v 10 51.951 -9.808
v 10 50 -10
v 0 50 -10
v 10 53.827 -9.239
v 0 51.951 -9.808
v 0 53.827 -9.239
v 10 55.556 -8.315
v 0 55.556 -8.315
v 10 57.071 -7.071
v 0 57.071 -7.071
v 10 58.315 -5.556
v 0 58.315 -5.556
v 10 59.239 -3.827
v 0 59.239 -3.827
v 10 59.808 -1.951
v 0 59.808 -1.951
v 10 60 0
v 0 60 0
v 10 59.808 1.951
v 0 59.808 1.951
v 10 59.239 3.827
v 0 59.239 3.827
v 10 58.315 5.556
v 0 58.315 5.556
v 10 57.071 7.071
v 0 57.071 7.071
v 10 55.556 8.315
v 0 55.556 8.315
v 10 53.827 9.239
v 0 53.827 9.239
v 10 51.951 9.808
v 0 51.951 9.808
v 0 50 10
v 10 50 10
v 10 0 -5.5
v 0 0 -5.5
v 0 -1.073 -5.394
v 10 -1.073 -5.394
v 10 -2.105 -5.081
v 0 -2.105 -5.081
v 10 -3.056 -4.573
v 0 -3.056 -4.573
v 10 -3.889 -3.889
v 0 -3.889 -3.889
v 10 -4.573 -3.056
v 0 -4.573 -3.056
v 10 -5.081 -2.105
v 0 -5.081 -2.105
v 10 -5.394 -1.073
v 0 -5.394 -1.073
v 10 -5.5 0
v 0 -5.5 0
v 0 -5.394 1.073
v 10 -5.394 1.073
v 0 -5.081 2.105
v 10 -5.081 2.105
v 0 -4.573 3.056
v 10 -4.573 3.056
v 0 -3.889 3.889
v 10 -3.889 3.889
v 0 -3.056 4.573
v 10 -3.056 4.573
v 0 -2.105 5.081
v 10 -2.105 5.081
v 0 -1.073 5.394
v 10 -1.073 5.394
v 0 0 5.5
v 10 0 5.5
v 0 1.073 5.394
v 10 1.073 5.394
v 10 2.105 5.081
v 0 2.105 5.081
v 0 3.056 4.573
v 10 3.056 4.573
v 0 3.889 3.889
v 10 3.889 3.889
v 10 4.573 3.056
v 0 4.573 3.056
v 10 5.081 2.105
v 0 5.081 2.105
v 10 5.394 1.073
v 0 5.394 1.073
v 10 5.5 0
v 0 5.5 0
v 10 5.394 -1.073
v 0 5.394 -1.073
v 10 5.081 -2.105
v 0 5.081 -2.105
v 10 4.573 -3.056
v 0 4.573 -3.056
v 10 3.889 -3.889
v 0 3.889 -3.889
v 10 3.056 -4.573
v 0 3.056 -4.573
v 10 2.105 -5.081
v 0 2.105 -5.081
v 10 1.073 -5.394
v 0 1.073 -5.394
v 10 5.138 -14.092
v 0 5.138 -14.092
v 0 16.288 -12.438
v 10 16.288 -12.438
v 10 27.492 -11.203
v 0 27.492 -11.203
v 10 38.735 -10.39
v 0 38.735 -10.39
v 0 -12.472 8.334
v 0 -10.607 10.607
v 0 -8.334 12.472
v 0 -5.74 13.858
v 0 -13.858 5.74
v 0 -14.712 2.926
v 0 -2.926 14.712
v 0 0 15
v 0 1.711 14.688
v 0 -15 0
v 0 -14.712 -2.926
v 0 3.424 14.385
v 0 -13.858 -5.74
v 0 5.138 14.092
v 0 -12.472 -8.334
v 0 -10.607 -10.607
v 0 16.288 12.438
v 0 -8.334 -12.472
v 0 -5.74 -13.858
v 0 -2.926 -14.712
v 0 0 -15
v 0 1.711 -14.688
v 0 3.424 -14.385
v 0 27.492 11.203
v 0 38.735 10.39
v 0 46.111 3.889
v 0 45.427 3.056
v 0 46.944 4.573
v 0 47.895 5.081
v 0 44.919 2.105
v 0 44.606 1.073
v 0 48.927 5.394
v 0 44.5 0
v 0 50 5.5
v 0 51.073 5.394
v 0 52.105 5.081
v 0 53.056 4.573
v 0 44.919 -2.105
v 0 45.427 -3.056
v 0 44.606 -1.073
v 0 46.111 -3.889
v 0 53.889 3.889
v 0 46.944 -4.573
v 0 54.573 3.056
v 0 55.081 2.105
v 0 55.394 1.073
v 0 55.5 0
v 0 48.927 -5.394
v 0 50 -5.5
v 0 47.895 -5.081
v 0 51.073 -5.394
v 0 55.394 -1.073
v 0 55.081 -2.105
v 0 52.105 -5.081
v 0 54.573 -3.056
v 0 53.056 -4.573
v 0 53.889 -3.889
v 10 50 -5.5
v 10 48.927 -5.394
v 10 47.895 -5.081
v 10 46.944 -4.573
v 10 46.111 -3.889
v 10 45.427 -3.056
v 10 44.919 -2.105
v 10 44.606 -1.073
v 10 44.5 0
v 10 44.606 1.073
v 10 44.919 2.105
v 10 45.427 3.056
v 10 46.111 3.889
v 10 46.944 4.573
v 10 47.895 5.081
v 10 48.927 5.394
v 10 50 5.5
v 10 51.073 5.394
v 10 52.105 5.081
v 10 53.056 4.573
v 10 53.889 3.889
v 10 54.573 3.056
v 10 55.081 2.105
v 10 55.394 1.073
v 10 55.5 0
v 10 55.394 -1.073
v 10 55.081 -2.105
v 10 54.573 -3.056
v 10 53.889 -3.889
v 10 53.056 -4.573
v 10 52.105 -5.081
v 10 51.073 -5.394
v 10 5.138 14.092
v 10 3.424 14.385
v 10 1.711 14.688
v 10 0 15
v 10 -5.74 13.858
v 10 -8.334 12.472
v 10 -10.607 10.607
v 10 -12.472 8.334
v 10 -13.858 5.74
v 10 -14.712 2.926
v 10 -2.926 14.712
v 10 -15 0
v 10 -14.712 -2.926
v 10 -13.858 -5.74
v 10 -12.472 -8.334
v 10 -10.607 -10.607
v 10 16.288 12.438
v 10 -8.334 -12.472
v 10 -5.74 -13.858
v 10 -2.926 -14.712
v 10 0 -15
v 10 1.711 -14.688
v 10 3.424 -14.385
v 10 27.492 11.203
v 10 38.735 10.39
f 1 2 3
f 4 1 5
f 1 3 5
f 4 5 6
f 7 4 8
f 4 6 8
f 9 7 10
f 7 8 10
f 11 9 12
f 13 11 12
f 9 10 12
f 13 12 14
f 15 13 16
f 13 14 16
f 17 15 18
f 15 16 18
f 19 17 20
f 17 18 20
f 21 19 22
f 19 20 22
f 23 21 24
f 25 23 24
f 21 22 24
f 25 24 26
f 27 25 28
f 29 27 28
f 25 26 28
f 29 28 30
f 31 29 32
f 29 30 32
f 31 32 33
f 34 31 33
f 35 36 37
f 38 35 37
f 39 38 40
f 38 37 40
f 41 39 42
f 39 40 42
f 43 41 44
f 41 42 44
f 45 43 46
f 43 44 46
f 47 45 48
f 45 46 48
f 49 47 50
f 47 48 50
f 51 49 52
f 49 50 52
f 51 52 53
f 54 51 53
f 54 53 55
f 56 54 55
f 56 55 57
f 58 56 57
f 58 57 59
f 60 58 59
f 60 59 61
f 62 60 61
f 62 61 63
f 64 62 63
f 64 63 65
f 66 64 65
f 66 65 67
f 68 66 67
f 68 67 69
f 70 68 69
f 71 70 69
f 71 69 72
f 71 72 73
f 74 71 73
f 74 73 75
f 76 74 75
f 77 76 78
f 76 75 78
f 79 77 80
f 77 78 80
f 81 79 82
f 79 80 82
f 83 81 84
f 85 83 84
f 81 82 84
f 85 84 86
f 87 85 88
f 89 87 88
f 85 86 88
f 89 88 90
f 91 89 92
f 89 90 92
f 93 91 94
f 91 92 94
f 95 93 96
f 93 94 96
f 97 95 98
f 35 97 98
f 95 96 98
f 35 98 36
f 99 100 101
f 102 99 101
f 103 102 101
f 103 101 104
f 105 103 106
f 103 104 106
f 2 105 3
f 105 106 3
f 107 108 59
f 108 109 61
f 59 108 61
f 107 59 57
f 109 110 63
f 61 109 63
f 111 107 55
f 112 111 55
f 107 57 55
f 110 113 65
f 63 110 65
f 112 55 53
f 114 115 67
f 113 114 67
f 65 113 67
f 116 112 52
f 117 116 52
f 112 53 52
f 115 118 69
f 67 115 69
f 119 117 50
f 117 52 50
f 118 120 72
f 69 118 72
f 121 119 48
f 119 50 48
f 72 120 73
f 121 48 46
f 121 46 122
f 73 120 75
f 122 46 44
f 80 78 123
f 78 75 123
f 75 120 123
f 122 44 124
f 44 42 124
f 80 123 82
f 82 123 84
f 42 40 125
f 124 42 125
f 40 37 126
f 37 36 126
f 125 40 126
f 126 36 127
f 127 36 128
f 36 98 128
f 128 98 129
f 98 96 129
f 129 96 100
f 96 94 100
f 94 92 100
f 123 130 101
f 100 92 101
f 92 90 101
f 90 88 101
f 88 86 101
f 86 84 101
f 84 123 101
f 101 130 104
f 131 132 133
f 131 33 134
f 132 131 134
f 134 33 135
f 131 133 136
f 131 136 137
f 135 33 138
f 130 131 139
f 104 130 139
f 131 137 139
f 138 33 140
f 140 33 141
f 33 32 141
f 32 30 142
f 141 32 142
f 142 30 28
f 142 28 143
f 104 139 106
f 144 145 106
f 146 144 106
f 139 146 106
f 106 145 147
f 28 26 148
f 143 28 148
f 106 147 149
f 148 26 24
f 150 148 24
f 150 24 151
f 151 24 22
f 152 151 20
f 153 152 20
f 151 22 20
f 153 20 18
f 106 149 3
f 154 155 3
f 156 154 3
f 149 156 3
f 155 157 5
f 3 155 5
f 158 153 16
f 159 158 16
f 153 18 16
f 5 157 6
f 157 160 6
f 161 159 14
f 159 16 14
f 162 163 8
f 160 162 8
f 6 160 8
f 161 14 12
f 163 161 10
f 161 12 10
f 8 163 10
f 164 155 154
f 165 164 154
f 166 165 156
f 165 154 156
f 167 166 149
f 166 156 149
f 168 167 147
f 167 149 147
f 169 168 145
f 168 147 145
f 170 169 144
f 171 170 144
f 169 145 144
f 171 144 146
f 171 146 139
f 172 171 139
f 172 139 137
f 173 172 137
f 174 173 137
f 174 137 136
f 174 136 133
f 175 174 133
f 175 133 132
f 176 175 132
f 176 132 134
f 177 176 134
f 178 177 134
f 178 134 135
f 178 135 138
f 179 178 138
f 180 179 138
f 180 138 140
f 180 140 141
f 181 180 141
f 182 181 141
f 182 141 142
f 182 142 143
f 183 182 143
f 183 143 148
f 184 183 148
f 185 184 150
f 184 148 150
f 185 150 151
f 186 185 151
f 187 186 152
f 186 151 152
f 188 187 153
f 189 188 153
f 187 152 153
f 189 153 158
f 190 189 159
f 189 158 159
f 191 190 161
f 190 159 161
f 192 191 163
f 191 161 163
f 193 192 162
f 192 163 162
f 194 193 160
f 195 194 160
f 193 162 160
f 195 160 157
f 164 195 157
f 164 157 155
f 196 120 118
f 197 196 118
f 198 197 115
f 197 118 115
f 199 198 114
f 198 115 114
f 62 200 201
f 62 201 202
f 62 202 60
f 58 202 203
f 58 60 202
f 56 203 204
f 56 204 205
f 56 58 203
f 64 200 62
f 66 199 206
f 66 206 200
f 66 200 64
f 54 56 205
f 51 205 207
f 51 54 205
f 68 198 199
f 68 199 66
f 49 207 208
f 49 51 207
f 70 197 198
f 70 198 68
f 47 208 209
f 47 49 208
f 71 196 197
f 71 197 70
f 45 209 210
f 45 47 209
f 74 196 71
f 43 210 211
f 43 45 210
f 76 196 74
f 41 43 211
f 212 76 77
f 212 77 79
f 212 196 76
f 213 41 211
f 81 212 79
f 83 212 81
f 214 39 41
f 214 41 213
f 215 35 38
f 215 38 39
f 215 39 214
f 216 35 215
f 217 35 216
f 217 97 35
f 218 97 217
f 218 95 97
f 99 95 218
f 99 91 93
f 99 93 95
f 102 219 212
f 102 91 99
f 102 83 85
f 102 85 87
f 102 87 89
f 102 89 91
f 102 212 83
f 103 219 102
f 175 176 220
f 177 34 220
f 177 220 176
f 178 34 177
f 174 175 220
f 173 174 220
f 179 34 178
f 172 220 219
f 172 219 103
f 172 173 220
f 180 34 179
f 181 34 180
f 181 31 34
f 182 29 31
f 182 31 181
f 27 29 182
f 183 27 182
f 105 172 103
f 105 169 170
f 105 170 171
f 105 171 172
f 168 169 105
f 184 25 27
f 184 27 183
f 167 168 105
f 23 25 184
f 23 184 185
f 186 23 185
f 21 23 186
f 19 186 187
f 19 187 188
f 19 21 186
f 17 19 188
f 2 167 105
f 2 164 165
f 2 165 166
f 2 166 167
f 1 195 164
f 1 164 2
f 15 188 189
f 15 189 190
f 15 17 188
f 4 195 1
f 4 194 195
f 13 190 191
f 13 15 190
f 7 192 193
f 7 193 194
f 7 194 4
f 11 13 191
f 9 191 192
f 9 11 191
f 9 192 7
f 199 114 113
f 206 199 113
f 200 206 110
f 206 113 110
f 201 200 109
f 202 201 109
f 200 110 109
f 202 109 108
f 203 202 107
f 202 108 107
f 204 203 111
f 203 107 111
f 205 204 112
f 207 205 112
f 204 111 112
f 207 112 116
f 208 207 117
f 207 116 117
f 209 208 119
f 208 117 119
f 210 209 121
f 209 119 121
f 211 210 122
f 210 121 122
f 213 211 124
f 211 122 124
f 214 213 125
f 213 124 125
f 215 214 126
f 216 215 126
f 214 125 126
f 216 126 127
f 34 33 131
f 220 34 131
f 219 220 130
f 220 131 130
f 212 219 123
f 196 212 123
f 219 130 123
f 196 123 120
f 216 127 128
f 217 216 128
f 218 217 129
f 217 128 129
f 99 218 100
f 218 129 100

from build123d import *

# Parameters (mm, degrees)
SKETCH1_R                       = 10
BOSS_EXTRUDE1_DEPTH             = 10
M10_CLEARANCE_HOLE1_D           = 11
M10_CLEARANCE_HOLE1_ON_FACE_2_D = 11


with BuildPart() as part:
    # Sketch1 → Boss-Extrude1 (new body)
    with BuildSketch(Plane(origin=(0, 0, 0), x_dir=(0, 0, -1), z_dir=(1, 0, 0))):
        with BuildLine():
            ThreePointArc((-10, 50), (-11.202983752, 27.492262307), (-14.092449523, 5.138371963))
            ThreePointArc((-14.092449523, 5.138371963), (0, 15), (14.092449523, 5.138371963))
            ThreePointArc((14.092449523, 5.138371963), (11.202983752, 27.492262307), (10, 50))
            ThreePointArc((10, 50), (0, 40), (-10, 50))
        make_face()
        with Locations((0, 50)):
            Circle(SKETCH1_R)
        with BuildLine():
            ThreePointArc((-14.092449523, 5.138371963), (-14.535053081, 2.567212815), (-15, 0))
            ThreePointArc((-15, 0), (0, -15), (15, 0))
            ThreePointArc((15, 0), (14.535053081, 2.567212815), (14.092449523, 5.138371963))
            ThreePointArc((14.092449523, 5.138371963), (0, 15), (-14.092449523, 5.138371963))
        make_face()
    extrude(amount=BOSS_EXTRUDE1_DEPTH)

    # M10 Clearance Hole1 (through all)
    with Locations(Plane(origin=(10, 50, 0), x_dir=(0, 0, 1), z_dir=(1, 0, 0))):
        with Locations((0, 0), (0, 50)):
            Hole(M10_CLEARANCE_HOLE1_D / 2)

    # M10 Clearance Hole1 on face 2 (through all)
    with Locations(Plane(origin=(0, 0, 0), x_dir=(0, 0, -1), z_dir=(-1, 0, 0))):
        with Locations((0, 0)):
            Hole(M10_CLEARANCE_HOLE1_ON_FACE_2_D / 2)


solid = part.part
